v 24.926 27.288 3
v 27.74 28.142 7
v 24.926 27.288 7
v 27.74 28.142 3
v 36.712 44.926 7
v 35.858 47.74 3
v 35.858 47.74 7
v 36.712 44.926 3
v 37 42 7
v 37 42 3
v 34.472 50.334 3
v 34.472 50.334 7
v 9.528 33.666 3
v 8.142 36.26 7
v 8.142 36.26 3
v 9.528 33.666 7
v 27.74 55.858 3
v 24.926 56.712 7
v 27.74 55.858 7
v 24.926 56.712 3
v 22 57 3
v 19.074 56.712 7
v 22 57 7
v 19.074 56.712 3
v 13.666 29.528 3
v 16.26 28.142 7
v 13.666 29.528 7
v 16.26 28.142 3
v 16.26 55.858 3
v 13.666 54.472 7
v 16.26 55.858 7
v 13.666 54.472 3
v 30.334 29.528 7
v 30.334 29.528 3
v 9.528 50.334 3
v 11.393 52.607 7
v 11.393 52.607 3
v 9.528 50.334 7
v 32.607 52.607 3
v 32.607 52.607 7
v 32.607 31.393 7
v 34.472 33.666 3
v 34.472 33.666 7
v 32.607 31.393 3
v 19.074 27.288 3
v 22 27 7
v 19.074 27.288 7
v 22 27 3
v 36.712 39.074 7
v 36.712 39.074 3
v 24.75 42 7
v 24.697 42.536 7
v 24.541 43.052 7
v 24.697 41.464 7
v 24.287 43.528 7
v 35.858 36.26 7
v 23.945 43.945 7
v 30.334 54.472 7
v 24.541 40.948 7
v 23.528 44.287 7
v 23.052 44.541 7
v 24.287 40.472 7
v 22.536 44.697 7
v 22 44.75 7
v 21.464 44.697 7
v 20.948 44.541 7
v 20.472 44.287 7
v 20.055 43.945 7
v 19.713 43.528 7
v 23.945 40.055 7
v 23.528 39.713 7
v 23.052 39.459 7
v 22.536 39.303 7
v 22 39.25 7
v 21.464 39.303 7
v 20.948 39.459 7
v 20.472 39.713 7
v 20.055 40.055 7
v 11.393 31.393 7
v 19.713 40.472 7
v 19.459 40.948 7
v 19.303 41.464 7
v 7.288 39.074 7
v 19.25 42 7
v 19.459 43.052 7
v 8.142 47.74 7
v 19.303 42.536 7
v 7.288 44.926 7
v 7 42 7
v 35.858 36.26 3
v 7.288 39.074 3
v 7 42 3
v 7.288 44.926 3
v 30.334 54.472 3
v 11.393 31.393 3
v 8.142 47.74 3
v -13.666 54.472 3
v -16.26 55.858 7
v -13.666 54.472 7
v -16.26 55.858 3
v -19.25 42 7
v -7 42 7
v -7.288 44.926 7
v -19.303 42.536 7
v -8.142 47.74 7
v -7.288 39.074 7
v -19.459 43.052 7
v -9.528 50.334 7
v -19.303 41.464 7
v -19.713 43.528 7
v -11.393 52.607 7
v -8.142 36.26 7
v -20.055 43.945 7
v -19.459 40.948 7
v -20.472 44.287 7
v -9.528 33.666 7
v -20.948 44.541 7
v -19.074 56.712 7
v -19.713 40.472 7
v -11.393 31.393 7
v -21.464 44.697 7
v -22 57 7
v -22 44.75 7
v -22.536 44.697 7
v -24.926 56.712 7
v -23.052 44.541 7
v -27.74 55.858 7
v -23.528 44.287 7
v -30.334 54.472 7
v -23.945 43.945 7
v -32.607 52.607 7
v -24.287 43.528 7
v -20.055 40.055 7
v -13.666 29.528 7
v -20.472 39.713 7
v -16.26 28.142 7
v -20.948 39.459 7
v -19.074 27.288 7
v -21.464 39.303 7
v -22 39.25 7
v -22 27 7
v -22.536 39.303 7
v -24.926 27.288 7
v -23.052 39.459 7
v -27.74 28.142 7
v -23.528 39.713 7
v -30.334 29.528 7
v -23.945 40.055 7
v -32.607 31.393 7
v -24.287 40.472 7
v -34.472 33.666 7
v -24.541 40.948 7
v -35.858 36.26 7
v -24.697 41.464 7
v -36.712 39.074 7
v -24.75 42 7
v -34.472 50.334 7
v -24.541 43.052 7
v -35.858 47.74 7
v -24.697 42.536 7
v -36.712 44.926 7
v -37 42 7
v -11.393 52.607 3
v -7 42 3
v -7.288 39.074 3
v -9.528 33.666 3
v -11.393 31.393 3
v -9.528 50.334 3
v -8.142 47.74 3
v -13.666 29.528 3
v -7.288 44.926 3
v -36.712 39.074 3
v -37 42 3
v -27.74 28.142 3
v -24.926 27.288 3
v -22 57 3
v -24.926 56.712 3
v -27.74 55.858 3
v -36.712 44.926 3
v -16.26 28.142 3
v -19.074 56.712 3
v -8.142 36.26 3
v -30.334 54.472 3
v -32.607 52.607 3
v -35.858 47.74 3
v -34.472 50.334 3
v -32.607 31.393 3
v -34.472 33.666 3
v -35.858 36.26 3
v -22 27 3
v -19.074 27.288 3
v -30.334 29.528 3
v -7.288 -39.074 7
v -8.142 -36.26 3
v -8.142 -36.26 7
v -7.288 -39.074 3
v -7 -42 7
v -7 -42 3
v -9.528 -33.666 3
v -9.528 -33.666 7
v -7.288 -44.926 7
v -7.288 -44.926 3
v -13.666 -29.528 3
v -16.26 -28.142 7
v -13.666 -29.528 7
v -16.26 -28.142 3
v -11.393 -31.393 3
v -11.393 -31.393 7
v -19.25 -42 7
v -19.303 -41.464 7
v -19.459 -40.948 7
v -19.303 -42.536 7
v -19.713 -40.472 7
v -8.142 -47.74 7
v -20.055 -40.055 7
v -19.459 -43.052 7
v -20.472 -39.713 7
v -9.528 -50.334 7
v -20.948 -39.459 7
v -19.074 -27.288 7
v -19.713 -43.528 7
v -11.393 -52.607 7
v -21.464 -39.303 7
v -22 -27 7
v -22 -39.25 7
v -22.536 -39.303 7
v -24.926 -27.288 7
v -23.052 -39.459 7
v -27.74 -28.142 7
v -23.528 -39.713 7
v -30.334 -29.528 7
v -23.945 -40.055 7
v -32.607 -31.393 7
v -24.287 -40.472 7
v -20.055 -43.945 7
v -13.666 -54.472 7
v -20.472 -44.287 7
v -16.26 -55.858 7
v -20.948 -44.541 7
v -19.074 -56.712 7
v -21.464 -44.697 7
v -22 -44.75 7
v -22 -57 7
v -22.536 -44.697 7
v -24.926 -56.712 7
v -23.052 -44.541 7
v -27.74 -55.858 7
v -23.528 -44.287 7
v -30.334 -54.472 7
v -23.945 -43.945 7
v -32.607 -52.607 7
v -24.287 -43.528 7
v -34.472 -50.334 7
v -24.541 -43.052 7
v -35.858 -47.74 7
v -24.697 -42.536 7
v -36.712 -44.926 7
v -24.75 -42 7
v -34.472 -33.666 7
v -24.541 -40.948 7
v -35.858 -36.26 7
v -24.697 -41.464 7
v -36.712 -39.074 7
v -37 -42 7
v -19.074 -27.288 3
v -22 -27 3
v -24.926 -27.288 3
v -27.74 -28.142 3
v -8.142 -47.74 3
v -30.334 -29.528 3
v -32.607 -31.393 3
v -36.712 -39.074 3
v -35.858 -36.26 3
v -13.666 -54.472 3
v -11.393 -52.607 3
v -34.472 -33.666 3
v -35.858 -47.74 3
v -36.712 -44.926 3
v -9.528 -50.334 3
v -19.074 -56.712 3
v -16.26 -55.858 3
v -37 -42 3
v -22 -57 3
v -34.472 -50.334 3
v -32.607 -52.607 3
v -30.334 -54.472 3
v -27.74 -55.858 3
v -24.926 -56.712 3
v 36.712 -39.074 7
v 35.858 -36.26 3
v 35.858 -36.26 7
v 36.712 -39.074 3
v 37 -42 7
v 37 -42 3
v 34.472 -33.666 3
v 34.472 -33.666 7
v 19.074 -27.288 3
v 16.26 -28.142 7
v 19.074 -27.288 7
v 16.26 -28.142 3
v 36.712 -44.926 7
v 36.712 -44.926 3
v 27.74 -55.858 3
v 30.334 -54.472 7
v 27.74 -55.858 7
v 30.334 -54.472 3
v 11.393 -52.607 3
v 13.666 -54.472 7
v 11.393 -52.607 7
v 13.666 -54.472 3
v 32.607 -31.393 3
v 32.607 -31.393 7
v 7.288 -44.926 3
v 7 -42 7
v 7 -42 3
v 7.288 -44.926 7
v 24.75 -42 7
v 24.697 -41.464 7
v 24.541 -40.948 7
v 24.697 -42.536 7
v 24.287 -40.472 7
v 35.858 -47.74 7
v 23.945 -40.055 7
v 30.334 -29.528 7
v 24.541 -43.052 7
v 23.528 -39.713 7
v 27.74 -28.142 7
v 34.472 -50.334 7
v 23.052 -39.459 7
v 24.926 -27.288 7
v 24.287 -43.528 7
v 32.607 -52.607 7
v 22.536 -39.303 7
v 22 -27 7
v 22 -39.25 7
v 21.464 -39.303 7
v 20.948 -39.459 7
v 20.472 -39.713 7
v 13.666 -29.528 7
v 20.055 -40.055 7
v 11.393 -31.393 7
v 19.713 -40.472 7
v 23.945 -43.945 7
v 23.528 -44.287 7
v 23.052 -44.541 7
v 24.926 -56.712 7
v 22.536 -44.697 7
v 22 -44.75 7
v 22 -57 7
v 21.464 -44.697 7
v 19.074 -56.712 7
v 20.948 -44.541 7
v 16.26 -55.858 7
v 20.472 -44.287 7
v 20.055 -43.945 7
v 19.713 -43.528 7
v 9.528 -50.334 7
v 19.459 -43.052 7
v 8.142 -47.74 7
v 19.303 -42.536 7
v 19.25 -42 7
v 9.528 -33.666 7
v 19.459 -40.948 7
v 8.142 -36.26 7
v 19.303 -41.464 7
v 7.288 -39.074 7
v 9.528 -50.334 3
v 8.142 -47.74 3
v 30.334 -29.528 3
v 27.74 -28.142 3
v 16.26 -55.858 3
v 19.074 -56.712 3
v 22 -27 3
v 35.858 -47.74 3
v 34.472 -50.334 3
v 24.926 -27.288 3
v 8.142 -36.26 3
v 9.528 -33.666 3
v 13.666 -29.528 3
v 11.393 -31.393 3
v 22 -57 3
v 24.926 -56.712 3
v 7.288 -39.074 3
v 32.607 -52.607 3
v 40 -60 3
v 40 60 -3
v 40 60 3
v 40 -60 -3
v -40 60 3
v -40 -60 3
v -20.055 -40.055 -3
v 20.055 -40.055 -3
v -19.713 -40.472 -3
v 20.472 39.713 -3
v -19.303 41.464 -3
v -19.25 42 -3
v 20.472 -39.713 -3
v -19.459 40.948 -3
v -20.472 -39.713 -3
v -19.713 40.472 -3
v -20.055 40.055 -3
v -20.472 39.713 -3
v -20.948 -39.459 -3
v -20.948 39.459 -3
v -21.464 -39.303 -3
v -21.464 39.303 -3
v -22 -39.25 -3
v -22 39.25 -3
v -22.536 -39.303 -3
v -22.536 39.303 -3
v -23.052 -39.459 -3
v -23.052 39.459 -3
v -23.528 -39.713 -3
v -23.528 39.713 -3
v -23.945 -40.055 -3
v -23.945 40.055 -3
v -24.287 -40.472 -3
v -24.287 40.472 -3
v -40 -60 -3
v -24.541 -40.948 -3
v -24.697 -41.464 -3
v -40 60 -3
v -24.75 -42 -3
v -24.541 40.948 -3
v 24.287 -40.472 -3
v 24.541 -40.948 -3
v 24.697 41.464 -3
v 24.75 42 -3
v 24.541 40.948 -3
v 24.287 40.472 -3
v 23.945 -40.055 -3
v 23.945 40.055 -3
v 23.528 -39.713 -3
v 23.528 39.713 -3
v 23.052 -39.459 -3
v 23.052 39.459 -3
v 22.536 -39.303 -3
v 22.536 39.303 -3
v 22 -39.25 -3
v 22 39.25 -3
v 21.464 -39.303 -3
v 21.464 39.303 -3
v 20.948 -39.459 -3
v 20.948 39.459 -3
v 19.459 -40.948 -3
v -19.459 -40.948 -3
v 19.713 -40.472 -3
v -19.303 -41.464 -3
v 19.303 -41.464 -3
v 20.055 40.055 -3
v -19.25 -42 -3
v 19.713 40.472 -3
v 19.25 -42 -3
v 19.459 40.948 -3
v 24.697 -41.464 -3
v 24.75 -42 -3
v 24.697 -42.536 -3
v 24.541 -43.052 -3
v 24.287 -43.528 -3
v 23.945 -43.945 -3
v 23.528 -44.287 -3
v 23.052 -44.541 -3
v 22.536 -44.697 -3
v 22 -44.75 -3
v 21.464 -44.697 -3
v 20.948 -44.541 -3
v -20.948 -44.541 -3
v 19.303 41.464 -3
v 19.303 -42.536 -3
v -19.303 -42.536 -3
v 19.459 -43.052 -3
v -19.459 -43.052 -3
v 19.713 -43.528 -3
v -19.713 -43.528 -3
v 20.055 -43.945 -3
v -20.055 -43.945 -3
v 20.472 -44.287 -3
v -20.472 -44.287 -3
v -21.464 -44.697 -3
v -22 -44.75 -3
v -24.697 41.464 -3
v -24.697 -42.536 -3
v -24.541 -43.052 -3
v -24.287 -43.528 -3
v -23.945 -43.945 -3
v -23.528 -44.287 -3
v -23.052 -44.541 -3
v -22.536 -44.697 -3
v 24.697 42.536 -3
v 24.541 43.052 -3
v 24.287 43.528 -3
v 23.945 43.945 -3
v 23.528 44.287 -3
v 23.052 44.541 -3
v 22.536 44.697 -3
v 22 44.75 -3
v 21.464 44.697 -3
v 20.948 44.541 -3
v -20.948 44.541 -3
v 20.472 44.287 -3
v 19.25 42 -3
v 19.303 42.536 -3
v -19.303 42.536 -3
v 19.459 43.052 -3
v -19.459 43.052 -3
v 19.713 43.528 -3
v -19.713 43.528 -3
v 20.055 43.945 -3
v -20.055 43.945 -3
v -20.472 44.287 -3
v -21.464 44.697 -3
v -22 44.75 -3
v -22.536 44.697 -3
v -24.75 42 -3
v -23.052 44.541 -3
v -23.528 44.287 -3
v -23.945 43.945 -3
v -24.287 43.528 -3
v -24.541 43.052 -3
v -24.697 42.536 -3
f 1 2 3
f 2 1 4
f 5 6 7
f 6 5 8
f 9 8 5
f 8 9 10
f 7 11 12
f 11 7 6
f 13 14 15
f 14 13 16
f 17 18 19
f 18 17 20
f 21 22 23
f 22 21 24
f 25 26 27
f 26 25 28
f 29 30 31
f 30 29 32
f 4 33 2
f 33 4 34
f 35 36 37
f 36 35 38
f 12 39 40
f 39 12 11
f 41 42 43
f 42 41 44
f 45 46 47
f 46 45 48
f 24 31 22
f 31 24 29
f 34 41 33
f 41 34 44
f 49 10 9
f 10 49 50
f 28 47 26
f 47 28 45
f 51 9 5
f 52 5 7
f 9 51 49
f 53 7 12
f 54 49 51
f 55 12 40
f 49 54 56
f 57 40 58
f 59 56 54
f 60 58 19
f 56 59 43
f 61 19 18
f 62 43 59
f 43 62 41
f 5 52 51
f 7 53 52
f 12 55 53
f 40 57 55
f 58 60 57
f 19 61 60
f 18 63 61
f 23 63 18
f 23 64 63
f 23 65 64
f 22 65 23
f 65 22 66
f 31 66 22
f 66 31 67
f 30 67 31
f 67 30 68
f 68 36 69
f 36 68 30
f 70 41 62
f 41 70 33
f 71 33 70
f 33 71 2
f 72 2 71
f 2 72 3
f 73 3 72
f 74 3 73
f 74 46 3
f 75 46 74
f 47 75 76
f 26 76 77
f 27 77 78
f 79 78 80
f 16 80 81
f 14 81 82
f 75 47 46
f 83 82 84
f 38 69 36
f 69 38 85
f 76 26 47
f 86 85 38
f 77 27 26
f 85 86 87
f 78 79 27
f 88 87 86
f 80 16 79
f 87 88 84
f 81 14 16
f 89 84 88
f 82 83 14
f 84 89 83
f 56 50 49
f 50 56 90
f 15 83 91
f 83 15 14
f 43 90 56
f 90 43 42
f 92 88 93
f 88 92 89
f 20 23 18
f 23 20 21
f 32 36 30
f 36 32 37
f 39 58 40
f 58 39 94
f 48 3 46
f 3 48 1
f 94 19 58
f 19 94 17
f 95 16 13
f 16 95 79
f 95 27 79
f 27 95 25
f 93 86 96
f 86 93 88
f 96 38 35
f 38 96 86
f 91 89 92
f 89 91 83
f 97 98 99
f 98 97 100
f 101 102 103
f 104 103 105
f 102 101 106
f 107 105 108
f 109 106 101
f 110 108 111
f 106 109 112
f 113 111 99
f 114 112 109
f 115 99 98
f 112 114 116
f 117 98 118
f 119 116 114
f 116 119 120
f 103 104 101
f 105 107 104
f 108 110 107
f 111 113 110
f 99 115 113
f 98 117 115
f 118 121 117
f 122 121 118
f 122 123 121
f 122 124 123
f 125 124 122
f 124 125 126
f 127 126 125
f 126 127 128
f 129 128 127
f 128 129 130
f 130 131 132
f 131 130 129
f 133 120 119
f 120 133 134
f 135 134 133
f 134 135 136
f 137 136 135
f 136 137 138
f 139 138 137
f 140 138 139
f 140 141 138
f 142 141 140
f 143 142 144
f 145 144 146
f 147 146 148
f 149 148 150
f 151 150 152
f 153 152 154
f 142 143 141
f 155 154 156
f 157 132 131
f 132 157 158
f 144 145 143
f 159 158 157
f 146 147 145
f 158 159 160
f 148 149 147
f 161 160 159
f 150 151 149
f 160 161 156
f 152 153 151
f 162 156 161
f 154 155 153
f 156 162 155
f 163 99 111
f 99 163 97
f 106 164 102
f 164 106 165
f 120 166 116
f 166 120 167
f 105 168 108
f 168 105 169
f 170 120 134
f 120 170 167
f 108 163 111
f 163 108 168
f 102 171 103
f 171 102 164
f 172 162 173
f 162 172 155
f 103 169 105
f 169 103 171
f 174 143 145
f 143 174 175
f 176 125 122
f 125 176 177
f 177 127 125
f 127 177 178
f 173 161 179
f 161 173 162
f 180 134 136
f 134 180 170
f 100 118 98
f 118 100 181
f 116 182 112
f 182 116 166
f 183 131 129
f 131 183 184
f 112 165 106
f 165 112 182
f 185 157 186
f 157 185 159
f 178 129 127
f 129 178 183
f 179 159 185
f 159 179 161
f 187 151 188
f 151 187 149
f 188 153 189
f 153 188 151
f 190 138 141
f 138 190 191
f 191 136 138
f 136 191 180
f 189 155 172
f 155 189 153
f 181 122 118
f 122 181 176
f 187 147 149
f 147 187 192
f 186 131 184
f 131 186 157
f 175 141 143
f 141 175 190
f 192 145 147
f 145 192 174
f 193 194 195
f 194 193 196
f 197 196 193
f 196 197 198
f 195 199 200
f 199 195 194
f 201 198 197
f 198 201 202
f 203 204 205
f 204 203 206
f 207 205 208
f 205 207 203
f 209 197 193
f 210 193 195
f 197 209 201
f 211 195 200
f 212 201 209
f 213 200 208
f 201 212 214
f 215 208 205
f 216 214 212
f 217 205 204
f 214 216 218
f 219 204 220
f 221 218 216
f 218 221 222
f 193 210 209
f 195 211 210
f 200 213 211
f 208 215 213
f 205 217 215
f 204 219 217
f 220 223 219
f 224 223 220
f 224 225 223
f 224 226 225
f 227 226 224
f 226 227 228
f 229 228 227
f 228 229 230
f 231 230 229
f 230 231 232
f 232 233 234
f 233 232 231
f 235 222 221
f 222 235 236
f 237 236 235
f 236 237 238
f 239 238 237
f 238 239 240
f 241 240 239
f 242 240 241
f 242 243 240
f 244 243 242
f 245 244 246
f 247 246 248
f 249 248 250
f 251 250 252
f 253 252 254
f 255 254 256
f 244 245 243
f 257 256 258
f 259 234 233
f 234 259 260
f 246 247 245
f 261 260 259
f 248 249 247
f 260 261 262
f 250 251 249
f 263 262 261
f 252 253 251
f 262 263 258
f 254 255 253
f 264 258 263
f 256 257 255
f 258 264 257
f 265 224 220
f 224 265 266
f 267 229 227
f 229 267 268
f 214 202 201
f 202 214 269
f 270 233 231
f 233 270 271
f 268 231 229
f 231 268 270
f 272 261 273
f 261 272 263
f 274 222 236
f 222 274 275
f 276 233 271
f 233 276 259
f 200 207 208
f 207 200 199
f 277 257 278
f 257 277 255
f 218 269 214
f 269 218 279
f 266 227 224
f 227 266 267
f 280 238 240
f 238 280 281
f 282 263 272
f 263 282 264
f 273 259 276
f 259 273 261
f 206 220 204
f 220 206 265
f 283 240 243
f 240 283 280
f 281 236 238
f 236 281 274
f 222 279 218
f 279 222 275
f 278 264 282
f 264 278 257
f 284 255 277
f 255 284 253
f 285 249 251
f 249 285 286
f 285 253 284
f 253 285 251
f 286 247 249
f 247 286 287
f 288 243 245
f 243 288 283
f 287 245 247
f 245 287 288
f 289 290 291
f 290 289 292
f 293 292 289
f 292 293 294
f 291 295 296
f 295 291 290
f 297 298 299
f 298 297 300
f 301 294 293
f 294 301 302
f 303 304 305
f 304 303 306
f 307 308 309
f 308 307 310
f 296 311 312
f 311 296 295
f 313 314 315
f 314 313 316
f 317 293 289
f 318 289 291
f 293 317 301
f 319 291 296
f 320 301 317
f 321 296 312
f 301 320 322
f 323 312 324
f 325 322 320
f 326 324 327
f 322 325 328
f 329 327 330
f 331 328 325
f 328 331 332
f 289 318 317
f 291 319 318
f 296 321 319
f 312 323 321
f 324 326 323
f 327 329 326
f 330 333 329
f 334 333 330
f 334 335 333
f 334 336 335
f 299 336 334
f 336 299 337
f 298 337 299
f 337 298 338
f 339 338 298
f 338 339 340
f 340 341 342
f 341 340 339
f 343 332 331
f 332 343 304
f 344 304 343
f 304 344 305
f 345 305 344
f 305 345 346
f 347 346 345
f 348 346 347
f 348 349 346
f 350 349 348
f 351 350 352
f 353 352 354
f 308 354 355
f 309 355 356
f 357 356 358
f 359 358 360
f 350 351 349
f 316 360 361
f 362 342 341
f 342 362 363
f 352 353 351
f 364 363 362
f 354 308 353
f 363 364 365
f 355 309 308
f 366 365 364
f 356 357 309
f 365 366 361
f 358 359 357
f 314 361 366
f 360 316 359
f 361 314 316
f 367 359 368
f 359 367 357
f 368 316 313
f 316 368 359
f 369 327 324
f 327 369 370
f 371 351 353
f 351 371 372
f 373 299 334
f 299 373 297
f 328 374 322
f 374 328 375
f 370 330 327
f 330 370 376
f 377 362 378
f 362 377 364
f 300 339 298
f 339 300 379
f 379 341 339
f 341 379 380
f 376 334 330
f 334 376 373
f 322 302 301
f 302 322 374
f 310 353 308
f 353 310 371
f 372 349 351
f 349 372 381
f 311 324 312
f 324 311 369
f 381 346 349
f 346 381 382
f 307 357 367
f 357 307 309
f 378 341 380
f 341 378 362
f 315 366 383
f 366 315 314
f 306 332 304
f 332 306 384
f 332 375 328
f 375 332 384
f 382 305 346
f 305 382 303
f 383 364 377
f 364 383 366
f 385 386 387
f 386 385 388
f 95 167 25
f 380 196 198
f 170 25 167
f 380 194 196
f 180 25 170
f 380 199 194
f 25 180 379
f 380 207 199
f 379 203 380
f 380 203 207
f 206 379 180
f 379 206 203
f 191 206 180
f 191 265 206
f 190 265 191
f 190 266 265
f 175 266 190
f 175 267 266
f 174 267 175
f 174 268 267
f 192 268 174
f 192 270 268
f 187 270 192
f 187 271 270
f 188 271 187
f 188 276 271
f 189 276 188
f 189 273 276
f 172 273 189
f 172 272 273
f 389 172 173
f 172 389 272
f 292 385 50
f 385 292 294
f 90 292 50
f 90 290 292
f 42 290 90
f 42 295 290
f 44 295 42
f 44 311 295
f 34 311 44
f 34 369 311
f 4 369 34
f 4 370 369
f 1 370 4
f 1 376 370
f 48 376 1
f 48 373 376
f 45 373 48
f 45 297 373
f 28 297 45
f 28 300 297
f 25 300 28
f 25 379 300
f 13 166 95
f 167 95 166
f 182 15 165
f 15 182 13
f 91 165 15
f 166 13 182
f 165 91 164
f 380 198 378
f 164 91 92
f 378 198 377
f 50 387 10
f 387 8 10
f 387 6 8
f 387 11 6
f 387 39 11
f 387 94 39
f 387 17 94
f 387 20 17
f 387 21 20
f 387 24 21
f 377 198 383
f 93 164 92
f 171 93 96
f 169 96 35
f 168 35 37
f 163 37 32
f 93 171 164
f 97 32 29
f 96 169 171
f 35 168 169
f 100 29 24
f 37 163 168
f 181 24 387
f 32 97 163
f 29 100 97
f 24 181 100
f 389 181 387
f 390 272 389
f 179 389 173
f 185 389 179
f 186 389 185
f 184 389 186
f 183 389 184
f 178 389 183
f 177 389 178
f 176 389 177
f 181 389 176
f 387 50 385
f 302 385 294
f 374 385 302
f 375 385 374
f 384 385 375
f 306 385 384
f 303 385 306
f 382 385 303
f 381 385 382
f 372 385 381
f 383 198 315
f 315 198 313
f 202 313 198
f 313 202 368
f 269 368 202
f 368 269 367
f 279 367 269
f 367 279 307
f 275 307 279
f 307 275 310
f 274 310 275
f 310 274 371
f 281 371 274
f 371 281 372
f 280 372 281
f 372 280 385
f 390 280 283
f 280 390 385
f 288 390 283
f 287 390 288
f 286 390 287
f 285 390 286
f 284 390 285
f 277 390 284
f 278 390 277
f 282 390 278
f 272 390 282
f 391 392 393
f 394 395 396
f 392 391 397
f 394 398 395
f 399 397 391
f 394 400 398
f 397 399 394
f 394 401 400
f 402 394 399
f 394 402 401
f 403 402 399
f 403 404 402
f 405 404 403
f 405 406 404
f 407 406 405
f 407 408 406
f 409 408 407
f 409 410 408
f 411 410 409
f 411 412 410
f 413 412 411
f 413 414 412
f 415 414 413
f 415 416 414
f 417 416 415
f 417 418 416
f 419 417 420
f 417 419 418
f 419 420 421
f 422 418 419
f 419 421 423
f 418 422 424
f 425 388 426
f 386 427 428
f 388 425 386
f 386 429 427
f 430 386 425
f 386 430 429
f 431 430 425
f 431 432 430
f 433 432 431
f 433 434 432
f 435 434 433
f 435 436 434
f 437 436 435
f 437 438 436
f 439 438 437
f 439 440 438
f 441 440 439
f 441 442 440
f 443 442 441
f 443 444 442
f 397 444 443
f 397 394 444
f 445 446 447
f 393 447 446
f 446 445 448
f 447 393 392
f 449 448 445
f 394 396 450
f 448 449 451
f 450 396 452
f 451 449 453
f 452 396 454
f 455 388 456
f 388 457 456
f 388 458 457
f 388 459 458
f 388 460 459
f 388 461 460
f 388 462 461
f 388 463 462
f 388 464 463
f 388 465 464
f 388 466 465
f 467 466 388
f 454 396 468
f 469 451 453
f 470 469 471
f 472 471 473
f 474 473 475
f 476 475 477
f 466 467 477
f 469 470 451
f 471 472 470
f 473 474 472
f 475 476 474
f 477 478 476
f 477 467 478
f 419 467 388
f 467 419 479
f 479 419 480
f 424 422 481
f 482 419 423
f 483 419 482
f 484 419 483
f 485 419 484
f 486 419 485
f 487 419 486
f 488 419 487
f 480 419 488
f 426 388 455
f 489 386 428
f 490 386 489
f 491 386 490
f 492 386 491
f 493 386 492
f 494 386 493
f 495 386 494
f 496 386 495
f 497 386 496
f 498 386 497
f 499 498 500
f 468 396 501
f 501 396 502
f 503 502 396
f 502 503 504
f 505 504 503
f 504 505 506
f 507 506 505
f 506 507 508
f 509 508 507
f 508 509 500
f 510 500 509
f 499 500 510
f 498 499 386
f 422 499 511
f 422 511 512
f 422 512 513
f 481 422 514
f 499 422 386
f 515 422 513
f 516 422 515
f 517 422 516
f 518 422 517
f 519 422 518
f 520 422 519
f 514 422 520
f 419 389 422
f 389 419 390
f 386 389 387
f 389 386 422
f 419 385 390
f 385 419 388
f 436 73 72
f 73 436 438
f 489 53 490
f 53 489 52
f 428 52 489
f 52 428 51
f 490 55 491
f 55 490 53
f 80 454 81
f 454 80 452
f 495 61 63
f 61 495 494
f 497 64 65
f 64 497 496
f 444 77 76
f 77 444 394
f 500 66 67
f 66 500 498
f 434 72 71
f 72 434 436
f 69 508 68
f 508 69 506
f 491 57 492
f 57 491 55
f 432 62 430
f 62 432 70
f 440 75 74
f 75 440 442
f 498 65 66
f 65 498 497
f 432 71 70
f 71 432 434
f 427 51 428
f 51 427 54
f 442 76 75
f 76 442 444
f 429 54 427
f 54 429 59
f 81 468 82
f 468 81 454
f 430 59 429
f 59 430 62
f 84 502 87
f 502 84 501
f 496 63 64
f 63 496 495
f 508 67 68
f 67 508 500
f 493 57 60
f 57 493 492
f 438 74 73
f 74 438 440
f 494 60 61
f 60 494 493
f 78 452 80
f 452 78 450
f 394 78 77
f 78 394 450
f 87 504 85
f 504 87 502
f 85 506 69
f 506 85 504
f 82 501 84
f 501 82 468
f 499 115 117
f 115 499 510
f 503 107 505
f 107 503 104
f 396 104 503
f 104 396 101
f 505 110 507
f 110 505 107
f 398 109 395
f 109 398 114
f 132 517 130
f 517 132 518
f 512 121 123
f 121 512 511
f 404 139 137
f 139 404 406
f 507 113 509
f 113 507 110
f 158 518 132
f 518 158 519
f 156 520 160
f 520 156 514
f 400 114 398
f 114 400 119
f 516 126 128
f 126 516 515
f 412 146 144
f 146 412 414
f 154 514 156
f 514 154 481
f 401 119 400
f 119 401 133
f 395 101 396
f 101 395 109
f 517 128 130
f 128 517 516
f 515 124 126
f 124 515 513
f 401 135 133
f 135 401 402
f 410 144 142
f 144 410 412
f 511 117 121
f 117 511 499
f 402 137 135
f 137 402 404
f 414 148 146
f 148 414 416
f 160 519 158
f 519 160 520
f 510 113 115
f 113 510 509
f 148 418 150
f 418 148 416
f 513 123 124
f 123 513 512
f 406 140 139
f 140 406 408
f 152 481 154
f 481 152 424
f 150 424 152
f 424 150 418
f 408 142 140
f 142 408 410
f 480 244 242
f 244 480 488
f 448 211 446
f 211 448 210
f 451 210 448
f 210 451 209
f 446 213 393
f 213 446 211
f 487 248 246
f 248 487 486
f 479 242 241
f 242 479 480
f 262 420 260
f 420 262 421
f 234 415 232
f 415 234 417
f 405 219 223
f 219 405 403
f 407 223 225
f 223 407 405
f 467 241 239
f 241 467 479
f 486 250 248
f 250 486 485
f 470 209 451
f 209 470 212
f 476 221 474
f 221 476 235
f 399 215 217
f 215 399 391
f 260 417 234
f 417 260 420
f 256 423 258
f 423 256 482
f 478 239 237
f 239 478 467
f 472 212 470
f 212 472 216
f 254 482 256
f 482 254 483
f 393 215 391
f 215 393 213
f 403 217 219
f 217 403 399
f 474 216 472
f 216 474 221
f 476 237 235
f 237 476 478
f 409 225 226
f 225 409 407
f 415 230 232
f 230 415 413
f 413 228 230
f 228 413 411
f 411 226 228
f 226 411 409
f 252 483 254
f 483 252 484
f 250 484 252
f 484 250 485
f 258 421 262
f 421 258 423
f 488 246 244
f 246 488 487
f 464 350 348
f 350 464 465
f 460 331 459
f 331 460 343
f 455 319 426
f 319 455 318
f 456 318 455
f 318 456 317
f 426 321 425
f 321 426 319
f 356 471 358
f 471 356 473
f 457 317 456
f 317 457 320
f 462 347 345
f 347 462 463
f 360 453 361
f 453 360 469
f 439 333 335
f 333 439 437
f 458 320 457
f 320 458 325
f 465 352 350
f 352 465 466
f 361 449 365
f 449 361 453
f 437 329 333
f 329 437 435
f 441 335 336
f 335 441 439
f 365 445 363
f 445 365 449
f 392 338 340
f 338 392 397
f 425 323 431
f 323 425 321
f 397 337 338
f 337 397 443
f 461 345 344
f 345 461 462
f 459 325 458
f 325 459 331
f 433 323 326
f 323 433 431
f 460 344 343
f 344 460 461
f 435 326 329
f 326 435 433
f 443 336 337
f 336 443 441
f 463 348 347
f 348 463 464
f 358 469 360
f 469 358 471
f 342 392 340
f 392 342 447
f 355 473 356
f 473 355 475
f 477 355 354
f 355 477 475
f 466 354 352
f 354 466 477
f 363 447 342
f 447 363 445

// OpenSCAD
$fn = 32;

// ----------------------------------------------------------------------
// Anchor pads 80 x 120 x 10
// four corner bosses with anchor holes
// ----------------------------------------------------------------------

// --- parameters (mm) ---
plate = [80, 120, 6];  // base plate size (x, y, z)
pads = 4;              // boss count, one per corner
edge = 18;             // boss centre offset from the plate edge
boss_d = 30;           // boss diameter
boss_h = 4;            // boss height above the base plate
hole_d = 5.5;          // hole diameter

// --- derived feature positions (mm) ---
height = plate[2] + boss_h;      // = 10   overall height of the part
corner_x = plate[0] / 2 - edge;  // = 22   boss centre X
corner_y = plate[1] / 2 - edge;  // = 42   boss centre Y
feature_centers = [
  [corner_x, corner_y],
  [-corner_x, corner_y],
  [-corner_x, -corner_y],
  [corner_x, -corner_y]
];   // boss centres, anchor holes are drilled there

// base plate, four bosses standing on it, anchor holes all the way through
difference() {
  union() {
    cube(plate, center = true);
    for (centre = feature_centers)
      translate([centre[0], centre[1], plate[2] / 2 - 1])
        cylinder(d = boss_d, h = boss_h + 1);
  }
  for (centre = feature_centers)
    translate([centre[0], centre[1], -height])
      cylinder(d = hole_d, h = 2 * height + 2);  // through boss and plate
}
